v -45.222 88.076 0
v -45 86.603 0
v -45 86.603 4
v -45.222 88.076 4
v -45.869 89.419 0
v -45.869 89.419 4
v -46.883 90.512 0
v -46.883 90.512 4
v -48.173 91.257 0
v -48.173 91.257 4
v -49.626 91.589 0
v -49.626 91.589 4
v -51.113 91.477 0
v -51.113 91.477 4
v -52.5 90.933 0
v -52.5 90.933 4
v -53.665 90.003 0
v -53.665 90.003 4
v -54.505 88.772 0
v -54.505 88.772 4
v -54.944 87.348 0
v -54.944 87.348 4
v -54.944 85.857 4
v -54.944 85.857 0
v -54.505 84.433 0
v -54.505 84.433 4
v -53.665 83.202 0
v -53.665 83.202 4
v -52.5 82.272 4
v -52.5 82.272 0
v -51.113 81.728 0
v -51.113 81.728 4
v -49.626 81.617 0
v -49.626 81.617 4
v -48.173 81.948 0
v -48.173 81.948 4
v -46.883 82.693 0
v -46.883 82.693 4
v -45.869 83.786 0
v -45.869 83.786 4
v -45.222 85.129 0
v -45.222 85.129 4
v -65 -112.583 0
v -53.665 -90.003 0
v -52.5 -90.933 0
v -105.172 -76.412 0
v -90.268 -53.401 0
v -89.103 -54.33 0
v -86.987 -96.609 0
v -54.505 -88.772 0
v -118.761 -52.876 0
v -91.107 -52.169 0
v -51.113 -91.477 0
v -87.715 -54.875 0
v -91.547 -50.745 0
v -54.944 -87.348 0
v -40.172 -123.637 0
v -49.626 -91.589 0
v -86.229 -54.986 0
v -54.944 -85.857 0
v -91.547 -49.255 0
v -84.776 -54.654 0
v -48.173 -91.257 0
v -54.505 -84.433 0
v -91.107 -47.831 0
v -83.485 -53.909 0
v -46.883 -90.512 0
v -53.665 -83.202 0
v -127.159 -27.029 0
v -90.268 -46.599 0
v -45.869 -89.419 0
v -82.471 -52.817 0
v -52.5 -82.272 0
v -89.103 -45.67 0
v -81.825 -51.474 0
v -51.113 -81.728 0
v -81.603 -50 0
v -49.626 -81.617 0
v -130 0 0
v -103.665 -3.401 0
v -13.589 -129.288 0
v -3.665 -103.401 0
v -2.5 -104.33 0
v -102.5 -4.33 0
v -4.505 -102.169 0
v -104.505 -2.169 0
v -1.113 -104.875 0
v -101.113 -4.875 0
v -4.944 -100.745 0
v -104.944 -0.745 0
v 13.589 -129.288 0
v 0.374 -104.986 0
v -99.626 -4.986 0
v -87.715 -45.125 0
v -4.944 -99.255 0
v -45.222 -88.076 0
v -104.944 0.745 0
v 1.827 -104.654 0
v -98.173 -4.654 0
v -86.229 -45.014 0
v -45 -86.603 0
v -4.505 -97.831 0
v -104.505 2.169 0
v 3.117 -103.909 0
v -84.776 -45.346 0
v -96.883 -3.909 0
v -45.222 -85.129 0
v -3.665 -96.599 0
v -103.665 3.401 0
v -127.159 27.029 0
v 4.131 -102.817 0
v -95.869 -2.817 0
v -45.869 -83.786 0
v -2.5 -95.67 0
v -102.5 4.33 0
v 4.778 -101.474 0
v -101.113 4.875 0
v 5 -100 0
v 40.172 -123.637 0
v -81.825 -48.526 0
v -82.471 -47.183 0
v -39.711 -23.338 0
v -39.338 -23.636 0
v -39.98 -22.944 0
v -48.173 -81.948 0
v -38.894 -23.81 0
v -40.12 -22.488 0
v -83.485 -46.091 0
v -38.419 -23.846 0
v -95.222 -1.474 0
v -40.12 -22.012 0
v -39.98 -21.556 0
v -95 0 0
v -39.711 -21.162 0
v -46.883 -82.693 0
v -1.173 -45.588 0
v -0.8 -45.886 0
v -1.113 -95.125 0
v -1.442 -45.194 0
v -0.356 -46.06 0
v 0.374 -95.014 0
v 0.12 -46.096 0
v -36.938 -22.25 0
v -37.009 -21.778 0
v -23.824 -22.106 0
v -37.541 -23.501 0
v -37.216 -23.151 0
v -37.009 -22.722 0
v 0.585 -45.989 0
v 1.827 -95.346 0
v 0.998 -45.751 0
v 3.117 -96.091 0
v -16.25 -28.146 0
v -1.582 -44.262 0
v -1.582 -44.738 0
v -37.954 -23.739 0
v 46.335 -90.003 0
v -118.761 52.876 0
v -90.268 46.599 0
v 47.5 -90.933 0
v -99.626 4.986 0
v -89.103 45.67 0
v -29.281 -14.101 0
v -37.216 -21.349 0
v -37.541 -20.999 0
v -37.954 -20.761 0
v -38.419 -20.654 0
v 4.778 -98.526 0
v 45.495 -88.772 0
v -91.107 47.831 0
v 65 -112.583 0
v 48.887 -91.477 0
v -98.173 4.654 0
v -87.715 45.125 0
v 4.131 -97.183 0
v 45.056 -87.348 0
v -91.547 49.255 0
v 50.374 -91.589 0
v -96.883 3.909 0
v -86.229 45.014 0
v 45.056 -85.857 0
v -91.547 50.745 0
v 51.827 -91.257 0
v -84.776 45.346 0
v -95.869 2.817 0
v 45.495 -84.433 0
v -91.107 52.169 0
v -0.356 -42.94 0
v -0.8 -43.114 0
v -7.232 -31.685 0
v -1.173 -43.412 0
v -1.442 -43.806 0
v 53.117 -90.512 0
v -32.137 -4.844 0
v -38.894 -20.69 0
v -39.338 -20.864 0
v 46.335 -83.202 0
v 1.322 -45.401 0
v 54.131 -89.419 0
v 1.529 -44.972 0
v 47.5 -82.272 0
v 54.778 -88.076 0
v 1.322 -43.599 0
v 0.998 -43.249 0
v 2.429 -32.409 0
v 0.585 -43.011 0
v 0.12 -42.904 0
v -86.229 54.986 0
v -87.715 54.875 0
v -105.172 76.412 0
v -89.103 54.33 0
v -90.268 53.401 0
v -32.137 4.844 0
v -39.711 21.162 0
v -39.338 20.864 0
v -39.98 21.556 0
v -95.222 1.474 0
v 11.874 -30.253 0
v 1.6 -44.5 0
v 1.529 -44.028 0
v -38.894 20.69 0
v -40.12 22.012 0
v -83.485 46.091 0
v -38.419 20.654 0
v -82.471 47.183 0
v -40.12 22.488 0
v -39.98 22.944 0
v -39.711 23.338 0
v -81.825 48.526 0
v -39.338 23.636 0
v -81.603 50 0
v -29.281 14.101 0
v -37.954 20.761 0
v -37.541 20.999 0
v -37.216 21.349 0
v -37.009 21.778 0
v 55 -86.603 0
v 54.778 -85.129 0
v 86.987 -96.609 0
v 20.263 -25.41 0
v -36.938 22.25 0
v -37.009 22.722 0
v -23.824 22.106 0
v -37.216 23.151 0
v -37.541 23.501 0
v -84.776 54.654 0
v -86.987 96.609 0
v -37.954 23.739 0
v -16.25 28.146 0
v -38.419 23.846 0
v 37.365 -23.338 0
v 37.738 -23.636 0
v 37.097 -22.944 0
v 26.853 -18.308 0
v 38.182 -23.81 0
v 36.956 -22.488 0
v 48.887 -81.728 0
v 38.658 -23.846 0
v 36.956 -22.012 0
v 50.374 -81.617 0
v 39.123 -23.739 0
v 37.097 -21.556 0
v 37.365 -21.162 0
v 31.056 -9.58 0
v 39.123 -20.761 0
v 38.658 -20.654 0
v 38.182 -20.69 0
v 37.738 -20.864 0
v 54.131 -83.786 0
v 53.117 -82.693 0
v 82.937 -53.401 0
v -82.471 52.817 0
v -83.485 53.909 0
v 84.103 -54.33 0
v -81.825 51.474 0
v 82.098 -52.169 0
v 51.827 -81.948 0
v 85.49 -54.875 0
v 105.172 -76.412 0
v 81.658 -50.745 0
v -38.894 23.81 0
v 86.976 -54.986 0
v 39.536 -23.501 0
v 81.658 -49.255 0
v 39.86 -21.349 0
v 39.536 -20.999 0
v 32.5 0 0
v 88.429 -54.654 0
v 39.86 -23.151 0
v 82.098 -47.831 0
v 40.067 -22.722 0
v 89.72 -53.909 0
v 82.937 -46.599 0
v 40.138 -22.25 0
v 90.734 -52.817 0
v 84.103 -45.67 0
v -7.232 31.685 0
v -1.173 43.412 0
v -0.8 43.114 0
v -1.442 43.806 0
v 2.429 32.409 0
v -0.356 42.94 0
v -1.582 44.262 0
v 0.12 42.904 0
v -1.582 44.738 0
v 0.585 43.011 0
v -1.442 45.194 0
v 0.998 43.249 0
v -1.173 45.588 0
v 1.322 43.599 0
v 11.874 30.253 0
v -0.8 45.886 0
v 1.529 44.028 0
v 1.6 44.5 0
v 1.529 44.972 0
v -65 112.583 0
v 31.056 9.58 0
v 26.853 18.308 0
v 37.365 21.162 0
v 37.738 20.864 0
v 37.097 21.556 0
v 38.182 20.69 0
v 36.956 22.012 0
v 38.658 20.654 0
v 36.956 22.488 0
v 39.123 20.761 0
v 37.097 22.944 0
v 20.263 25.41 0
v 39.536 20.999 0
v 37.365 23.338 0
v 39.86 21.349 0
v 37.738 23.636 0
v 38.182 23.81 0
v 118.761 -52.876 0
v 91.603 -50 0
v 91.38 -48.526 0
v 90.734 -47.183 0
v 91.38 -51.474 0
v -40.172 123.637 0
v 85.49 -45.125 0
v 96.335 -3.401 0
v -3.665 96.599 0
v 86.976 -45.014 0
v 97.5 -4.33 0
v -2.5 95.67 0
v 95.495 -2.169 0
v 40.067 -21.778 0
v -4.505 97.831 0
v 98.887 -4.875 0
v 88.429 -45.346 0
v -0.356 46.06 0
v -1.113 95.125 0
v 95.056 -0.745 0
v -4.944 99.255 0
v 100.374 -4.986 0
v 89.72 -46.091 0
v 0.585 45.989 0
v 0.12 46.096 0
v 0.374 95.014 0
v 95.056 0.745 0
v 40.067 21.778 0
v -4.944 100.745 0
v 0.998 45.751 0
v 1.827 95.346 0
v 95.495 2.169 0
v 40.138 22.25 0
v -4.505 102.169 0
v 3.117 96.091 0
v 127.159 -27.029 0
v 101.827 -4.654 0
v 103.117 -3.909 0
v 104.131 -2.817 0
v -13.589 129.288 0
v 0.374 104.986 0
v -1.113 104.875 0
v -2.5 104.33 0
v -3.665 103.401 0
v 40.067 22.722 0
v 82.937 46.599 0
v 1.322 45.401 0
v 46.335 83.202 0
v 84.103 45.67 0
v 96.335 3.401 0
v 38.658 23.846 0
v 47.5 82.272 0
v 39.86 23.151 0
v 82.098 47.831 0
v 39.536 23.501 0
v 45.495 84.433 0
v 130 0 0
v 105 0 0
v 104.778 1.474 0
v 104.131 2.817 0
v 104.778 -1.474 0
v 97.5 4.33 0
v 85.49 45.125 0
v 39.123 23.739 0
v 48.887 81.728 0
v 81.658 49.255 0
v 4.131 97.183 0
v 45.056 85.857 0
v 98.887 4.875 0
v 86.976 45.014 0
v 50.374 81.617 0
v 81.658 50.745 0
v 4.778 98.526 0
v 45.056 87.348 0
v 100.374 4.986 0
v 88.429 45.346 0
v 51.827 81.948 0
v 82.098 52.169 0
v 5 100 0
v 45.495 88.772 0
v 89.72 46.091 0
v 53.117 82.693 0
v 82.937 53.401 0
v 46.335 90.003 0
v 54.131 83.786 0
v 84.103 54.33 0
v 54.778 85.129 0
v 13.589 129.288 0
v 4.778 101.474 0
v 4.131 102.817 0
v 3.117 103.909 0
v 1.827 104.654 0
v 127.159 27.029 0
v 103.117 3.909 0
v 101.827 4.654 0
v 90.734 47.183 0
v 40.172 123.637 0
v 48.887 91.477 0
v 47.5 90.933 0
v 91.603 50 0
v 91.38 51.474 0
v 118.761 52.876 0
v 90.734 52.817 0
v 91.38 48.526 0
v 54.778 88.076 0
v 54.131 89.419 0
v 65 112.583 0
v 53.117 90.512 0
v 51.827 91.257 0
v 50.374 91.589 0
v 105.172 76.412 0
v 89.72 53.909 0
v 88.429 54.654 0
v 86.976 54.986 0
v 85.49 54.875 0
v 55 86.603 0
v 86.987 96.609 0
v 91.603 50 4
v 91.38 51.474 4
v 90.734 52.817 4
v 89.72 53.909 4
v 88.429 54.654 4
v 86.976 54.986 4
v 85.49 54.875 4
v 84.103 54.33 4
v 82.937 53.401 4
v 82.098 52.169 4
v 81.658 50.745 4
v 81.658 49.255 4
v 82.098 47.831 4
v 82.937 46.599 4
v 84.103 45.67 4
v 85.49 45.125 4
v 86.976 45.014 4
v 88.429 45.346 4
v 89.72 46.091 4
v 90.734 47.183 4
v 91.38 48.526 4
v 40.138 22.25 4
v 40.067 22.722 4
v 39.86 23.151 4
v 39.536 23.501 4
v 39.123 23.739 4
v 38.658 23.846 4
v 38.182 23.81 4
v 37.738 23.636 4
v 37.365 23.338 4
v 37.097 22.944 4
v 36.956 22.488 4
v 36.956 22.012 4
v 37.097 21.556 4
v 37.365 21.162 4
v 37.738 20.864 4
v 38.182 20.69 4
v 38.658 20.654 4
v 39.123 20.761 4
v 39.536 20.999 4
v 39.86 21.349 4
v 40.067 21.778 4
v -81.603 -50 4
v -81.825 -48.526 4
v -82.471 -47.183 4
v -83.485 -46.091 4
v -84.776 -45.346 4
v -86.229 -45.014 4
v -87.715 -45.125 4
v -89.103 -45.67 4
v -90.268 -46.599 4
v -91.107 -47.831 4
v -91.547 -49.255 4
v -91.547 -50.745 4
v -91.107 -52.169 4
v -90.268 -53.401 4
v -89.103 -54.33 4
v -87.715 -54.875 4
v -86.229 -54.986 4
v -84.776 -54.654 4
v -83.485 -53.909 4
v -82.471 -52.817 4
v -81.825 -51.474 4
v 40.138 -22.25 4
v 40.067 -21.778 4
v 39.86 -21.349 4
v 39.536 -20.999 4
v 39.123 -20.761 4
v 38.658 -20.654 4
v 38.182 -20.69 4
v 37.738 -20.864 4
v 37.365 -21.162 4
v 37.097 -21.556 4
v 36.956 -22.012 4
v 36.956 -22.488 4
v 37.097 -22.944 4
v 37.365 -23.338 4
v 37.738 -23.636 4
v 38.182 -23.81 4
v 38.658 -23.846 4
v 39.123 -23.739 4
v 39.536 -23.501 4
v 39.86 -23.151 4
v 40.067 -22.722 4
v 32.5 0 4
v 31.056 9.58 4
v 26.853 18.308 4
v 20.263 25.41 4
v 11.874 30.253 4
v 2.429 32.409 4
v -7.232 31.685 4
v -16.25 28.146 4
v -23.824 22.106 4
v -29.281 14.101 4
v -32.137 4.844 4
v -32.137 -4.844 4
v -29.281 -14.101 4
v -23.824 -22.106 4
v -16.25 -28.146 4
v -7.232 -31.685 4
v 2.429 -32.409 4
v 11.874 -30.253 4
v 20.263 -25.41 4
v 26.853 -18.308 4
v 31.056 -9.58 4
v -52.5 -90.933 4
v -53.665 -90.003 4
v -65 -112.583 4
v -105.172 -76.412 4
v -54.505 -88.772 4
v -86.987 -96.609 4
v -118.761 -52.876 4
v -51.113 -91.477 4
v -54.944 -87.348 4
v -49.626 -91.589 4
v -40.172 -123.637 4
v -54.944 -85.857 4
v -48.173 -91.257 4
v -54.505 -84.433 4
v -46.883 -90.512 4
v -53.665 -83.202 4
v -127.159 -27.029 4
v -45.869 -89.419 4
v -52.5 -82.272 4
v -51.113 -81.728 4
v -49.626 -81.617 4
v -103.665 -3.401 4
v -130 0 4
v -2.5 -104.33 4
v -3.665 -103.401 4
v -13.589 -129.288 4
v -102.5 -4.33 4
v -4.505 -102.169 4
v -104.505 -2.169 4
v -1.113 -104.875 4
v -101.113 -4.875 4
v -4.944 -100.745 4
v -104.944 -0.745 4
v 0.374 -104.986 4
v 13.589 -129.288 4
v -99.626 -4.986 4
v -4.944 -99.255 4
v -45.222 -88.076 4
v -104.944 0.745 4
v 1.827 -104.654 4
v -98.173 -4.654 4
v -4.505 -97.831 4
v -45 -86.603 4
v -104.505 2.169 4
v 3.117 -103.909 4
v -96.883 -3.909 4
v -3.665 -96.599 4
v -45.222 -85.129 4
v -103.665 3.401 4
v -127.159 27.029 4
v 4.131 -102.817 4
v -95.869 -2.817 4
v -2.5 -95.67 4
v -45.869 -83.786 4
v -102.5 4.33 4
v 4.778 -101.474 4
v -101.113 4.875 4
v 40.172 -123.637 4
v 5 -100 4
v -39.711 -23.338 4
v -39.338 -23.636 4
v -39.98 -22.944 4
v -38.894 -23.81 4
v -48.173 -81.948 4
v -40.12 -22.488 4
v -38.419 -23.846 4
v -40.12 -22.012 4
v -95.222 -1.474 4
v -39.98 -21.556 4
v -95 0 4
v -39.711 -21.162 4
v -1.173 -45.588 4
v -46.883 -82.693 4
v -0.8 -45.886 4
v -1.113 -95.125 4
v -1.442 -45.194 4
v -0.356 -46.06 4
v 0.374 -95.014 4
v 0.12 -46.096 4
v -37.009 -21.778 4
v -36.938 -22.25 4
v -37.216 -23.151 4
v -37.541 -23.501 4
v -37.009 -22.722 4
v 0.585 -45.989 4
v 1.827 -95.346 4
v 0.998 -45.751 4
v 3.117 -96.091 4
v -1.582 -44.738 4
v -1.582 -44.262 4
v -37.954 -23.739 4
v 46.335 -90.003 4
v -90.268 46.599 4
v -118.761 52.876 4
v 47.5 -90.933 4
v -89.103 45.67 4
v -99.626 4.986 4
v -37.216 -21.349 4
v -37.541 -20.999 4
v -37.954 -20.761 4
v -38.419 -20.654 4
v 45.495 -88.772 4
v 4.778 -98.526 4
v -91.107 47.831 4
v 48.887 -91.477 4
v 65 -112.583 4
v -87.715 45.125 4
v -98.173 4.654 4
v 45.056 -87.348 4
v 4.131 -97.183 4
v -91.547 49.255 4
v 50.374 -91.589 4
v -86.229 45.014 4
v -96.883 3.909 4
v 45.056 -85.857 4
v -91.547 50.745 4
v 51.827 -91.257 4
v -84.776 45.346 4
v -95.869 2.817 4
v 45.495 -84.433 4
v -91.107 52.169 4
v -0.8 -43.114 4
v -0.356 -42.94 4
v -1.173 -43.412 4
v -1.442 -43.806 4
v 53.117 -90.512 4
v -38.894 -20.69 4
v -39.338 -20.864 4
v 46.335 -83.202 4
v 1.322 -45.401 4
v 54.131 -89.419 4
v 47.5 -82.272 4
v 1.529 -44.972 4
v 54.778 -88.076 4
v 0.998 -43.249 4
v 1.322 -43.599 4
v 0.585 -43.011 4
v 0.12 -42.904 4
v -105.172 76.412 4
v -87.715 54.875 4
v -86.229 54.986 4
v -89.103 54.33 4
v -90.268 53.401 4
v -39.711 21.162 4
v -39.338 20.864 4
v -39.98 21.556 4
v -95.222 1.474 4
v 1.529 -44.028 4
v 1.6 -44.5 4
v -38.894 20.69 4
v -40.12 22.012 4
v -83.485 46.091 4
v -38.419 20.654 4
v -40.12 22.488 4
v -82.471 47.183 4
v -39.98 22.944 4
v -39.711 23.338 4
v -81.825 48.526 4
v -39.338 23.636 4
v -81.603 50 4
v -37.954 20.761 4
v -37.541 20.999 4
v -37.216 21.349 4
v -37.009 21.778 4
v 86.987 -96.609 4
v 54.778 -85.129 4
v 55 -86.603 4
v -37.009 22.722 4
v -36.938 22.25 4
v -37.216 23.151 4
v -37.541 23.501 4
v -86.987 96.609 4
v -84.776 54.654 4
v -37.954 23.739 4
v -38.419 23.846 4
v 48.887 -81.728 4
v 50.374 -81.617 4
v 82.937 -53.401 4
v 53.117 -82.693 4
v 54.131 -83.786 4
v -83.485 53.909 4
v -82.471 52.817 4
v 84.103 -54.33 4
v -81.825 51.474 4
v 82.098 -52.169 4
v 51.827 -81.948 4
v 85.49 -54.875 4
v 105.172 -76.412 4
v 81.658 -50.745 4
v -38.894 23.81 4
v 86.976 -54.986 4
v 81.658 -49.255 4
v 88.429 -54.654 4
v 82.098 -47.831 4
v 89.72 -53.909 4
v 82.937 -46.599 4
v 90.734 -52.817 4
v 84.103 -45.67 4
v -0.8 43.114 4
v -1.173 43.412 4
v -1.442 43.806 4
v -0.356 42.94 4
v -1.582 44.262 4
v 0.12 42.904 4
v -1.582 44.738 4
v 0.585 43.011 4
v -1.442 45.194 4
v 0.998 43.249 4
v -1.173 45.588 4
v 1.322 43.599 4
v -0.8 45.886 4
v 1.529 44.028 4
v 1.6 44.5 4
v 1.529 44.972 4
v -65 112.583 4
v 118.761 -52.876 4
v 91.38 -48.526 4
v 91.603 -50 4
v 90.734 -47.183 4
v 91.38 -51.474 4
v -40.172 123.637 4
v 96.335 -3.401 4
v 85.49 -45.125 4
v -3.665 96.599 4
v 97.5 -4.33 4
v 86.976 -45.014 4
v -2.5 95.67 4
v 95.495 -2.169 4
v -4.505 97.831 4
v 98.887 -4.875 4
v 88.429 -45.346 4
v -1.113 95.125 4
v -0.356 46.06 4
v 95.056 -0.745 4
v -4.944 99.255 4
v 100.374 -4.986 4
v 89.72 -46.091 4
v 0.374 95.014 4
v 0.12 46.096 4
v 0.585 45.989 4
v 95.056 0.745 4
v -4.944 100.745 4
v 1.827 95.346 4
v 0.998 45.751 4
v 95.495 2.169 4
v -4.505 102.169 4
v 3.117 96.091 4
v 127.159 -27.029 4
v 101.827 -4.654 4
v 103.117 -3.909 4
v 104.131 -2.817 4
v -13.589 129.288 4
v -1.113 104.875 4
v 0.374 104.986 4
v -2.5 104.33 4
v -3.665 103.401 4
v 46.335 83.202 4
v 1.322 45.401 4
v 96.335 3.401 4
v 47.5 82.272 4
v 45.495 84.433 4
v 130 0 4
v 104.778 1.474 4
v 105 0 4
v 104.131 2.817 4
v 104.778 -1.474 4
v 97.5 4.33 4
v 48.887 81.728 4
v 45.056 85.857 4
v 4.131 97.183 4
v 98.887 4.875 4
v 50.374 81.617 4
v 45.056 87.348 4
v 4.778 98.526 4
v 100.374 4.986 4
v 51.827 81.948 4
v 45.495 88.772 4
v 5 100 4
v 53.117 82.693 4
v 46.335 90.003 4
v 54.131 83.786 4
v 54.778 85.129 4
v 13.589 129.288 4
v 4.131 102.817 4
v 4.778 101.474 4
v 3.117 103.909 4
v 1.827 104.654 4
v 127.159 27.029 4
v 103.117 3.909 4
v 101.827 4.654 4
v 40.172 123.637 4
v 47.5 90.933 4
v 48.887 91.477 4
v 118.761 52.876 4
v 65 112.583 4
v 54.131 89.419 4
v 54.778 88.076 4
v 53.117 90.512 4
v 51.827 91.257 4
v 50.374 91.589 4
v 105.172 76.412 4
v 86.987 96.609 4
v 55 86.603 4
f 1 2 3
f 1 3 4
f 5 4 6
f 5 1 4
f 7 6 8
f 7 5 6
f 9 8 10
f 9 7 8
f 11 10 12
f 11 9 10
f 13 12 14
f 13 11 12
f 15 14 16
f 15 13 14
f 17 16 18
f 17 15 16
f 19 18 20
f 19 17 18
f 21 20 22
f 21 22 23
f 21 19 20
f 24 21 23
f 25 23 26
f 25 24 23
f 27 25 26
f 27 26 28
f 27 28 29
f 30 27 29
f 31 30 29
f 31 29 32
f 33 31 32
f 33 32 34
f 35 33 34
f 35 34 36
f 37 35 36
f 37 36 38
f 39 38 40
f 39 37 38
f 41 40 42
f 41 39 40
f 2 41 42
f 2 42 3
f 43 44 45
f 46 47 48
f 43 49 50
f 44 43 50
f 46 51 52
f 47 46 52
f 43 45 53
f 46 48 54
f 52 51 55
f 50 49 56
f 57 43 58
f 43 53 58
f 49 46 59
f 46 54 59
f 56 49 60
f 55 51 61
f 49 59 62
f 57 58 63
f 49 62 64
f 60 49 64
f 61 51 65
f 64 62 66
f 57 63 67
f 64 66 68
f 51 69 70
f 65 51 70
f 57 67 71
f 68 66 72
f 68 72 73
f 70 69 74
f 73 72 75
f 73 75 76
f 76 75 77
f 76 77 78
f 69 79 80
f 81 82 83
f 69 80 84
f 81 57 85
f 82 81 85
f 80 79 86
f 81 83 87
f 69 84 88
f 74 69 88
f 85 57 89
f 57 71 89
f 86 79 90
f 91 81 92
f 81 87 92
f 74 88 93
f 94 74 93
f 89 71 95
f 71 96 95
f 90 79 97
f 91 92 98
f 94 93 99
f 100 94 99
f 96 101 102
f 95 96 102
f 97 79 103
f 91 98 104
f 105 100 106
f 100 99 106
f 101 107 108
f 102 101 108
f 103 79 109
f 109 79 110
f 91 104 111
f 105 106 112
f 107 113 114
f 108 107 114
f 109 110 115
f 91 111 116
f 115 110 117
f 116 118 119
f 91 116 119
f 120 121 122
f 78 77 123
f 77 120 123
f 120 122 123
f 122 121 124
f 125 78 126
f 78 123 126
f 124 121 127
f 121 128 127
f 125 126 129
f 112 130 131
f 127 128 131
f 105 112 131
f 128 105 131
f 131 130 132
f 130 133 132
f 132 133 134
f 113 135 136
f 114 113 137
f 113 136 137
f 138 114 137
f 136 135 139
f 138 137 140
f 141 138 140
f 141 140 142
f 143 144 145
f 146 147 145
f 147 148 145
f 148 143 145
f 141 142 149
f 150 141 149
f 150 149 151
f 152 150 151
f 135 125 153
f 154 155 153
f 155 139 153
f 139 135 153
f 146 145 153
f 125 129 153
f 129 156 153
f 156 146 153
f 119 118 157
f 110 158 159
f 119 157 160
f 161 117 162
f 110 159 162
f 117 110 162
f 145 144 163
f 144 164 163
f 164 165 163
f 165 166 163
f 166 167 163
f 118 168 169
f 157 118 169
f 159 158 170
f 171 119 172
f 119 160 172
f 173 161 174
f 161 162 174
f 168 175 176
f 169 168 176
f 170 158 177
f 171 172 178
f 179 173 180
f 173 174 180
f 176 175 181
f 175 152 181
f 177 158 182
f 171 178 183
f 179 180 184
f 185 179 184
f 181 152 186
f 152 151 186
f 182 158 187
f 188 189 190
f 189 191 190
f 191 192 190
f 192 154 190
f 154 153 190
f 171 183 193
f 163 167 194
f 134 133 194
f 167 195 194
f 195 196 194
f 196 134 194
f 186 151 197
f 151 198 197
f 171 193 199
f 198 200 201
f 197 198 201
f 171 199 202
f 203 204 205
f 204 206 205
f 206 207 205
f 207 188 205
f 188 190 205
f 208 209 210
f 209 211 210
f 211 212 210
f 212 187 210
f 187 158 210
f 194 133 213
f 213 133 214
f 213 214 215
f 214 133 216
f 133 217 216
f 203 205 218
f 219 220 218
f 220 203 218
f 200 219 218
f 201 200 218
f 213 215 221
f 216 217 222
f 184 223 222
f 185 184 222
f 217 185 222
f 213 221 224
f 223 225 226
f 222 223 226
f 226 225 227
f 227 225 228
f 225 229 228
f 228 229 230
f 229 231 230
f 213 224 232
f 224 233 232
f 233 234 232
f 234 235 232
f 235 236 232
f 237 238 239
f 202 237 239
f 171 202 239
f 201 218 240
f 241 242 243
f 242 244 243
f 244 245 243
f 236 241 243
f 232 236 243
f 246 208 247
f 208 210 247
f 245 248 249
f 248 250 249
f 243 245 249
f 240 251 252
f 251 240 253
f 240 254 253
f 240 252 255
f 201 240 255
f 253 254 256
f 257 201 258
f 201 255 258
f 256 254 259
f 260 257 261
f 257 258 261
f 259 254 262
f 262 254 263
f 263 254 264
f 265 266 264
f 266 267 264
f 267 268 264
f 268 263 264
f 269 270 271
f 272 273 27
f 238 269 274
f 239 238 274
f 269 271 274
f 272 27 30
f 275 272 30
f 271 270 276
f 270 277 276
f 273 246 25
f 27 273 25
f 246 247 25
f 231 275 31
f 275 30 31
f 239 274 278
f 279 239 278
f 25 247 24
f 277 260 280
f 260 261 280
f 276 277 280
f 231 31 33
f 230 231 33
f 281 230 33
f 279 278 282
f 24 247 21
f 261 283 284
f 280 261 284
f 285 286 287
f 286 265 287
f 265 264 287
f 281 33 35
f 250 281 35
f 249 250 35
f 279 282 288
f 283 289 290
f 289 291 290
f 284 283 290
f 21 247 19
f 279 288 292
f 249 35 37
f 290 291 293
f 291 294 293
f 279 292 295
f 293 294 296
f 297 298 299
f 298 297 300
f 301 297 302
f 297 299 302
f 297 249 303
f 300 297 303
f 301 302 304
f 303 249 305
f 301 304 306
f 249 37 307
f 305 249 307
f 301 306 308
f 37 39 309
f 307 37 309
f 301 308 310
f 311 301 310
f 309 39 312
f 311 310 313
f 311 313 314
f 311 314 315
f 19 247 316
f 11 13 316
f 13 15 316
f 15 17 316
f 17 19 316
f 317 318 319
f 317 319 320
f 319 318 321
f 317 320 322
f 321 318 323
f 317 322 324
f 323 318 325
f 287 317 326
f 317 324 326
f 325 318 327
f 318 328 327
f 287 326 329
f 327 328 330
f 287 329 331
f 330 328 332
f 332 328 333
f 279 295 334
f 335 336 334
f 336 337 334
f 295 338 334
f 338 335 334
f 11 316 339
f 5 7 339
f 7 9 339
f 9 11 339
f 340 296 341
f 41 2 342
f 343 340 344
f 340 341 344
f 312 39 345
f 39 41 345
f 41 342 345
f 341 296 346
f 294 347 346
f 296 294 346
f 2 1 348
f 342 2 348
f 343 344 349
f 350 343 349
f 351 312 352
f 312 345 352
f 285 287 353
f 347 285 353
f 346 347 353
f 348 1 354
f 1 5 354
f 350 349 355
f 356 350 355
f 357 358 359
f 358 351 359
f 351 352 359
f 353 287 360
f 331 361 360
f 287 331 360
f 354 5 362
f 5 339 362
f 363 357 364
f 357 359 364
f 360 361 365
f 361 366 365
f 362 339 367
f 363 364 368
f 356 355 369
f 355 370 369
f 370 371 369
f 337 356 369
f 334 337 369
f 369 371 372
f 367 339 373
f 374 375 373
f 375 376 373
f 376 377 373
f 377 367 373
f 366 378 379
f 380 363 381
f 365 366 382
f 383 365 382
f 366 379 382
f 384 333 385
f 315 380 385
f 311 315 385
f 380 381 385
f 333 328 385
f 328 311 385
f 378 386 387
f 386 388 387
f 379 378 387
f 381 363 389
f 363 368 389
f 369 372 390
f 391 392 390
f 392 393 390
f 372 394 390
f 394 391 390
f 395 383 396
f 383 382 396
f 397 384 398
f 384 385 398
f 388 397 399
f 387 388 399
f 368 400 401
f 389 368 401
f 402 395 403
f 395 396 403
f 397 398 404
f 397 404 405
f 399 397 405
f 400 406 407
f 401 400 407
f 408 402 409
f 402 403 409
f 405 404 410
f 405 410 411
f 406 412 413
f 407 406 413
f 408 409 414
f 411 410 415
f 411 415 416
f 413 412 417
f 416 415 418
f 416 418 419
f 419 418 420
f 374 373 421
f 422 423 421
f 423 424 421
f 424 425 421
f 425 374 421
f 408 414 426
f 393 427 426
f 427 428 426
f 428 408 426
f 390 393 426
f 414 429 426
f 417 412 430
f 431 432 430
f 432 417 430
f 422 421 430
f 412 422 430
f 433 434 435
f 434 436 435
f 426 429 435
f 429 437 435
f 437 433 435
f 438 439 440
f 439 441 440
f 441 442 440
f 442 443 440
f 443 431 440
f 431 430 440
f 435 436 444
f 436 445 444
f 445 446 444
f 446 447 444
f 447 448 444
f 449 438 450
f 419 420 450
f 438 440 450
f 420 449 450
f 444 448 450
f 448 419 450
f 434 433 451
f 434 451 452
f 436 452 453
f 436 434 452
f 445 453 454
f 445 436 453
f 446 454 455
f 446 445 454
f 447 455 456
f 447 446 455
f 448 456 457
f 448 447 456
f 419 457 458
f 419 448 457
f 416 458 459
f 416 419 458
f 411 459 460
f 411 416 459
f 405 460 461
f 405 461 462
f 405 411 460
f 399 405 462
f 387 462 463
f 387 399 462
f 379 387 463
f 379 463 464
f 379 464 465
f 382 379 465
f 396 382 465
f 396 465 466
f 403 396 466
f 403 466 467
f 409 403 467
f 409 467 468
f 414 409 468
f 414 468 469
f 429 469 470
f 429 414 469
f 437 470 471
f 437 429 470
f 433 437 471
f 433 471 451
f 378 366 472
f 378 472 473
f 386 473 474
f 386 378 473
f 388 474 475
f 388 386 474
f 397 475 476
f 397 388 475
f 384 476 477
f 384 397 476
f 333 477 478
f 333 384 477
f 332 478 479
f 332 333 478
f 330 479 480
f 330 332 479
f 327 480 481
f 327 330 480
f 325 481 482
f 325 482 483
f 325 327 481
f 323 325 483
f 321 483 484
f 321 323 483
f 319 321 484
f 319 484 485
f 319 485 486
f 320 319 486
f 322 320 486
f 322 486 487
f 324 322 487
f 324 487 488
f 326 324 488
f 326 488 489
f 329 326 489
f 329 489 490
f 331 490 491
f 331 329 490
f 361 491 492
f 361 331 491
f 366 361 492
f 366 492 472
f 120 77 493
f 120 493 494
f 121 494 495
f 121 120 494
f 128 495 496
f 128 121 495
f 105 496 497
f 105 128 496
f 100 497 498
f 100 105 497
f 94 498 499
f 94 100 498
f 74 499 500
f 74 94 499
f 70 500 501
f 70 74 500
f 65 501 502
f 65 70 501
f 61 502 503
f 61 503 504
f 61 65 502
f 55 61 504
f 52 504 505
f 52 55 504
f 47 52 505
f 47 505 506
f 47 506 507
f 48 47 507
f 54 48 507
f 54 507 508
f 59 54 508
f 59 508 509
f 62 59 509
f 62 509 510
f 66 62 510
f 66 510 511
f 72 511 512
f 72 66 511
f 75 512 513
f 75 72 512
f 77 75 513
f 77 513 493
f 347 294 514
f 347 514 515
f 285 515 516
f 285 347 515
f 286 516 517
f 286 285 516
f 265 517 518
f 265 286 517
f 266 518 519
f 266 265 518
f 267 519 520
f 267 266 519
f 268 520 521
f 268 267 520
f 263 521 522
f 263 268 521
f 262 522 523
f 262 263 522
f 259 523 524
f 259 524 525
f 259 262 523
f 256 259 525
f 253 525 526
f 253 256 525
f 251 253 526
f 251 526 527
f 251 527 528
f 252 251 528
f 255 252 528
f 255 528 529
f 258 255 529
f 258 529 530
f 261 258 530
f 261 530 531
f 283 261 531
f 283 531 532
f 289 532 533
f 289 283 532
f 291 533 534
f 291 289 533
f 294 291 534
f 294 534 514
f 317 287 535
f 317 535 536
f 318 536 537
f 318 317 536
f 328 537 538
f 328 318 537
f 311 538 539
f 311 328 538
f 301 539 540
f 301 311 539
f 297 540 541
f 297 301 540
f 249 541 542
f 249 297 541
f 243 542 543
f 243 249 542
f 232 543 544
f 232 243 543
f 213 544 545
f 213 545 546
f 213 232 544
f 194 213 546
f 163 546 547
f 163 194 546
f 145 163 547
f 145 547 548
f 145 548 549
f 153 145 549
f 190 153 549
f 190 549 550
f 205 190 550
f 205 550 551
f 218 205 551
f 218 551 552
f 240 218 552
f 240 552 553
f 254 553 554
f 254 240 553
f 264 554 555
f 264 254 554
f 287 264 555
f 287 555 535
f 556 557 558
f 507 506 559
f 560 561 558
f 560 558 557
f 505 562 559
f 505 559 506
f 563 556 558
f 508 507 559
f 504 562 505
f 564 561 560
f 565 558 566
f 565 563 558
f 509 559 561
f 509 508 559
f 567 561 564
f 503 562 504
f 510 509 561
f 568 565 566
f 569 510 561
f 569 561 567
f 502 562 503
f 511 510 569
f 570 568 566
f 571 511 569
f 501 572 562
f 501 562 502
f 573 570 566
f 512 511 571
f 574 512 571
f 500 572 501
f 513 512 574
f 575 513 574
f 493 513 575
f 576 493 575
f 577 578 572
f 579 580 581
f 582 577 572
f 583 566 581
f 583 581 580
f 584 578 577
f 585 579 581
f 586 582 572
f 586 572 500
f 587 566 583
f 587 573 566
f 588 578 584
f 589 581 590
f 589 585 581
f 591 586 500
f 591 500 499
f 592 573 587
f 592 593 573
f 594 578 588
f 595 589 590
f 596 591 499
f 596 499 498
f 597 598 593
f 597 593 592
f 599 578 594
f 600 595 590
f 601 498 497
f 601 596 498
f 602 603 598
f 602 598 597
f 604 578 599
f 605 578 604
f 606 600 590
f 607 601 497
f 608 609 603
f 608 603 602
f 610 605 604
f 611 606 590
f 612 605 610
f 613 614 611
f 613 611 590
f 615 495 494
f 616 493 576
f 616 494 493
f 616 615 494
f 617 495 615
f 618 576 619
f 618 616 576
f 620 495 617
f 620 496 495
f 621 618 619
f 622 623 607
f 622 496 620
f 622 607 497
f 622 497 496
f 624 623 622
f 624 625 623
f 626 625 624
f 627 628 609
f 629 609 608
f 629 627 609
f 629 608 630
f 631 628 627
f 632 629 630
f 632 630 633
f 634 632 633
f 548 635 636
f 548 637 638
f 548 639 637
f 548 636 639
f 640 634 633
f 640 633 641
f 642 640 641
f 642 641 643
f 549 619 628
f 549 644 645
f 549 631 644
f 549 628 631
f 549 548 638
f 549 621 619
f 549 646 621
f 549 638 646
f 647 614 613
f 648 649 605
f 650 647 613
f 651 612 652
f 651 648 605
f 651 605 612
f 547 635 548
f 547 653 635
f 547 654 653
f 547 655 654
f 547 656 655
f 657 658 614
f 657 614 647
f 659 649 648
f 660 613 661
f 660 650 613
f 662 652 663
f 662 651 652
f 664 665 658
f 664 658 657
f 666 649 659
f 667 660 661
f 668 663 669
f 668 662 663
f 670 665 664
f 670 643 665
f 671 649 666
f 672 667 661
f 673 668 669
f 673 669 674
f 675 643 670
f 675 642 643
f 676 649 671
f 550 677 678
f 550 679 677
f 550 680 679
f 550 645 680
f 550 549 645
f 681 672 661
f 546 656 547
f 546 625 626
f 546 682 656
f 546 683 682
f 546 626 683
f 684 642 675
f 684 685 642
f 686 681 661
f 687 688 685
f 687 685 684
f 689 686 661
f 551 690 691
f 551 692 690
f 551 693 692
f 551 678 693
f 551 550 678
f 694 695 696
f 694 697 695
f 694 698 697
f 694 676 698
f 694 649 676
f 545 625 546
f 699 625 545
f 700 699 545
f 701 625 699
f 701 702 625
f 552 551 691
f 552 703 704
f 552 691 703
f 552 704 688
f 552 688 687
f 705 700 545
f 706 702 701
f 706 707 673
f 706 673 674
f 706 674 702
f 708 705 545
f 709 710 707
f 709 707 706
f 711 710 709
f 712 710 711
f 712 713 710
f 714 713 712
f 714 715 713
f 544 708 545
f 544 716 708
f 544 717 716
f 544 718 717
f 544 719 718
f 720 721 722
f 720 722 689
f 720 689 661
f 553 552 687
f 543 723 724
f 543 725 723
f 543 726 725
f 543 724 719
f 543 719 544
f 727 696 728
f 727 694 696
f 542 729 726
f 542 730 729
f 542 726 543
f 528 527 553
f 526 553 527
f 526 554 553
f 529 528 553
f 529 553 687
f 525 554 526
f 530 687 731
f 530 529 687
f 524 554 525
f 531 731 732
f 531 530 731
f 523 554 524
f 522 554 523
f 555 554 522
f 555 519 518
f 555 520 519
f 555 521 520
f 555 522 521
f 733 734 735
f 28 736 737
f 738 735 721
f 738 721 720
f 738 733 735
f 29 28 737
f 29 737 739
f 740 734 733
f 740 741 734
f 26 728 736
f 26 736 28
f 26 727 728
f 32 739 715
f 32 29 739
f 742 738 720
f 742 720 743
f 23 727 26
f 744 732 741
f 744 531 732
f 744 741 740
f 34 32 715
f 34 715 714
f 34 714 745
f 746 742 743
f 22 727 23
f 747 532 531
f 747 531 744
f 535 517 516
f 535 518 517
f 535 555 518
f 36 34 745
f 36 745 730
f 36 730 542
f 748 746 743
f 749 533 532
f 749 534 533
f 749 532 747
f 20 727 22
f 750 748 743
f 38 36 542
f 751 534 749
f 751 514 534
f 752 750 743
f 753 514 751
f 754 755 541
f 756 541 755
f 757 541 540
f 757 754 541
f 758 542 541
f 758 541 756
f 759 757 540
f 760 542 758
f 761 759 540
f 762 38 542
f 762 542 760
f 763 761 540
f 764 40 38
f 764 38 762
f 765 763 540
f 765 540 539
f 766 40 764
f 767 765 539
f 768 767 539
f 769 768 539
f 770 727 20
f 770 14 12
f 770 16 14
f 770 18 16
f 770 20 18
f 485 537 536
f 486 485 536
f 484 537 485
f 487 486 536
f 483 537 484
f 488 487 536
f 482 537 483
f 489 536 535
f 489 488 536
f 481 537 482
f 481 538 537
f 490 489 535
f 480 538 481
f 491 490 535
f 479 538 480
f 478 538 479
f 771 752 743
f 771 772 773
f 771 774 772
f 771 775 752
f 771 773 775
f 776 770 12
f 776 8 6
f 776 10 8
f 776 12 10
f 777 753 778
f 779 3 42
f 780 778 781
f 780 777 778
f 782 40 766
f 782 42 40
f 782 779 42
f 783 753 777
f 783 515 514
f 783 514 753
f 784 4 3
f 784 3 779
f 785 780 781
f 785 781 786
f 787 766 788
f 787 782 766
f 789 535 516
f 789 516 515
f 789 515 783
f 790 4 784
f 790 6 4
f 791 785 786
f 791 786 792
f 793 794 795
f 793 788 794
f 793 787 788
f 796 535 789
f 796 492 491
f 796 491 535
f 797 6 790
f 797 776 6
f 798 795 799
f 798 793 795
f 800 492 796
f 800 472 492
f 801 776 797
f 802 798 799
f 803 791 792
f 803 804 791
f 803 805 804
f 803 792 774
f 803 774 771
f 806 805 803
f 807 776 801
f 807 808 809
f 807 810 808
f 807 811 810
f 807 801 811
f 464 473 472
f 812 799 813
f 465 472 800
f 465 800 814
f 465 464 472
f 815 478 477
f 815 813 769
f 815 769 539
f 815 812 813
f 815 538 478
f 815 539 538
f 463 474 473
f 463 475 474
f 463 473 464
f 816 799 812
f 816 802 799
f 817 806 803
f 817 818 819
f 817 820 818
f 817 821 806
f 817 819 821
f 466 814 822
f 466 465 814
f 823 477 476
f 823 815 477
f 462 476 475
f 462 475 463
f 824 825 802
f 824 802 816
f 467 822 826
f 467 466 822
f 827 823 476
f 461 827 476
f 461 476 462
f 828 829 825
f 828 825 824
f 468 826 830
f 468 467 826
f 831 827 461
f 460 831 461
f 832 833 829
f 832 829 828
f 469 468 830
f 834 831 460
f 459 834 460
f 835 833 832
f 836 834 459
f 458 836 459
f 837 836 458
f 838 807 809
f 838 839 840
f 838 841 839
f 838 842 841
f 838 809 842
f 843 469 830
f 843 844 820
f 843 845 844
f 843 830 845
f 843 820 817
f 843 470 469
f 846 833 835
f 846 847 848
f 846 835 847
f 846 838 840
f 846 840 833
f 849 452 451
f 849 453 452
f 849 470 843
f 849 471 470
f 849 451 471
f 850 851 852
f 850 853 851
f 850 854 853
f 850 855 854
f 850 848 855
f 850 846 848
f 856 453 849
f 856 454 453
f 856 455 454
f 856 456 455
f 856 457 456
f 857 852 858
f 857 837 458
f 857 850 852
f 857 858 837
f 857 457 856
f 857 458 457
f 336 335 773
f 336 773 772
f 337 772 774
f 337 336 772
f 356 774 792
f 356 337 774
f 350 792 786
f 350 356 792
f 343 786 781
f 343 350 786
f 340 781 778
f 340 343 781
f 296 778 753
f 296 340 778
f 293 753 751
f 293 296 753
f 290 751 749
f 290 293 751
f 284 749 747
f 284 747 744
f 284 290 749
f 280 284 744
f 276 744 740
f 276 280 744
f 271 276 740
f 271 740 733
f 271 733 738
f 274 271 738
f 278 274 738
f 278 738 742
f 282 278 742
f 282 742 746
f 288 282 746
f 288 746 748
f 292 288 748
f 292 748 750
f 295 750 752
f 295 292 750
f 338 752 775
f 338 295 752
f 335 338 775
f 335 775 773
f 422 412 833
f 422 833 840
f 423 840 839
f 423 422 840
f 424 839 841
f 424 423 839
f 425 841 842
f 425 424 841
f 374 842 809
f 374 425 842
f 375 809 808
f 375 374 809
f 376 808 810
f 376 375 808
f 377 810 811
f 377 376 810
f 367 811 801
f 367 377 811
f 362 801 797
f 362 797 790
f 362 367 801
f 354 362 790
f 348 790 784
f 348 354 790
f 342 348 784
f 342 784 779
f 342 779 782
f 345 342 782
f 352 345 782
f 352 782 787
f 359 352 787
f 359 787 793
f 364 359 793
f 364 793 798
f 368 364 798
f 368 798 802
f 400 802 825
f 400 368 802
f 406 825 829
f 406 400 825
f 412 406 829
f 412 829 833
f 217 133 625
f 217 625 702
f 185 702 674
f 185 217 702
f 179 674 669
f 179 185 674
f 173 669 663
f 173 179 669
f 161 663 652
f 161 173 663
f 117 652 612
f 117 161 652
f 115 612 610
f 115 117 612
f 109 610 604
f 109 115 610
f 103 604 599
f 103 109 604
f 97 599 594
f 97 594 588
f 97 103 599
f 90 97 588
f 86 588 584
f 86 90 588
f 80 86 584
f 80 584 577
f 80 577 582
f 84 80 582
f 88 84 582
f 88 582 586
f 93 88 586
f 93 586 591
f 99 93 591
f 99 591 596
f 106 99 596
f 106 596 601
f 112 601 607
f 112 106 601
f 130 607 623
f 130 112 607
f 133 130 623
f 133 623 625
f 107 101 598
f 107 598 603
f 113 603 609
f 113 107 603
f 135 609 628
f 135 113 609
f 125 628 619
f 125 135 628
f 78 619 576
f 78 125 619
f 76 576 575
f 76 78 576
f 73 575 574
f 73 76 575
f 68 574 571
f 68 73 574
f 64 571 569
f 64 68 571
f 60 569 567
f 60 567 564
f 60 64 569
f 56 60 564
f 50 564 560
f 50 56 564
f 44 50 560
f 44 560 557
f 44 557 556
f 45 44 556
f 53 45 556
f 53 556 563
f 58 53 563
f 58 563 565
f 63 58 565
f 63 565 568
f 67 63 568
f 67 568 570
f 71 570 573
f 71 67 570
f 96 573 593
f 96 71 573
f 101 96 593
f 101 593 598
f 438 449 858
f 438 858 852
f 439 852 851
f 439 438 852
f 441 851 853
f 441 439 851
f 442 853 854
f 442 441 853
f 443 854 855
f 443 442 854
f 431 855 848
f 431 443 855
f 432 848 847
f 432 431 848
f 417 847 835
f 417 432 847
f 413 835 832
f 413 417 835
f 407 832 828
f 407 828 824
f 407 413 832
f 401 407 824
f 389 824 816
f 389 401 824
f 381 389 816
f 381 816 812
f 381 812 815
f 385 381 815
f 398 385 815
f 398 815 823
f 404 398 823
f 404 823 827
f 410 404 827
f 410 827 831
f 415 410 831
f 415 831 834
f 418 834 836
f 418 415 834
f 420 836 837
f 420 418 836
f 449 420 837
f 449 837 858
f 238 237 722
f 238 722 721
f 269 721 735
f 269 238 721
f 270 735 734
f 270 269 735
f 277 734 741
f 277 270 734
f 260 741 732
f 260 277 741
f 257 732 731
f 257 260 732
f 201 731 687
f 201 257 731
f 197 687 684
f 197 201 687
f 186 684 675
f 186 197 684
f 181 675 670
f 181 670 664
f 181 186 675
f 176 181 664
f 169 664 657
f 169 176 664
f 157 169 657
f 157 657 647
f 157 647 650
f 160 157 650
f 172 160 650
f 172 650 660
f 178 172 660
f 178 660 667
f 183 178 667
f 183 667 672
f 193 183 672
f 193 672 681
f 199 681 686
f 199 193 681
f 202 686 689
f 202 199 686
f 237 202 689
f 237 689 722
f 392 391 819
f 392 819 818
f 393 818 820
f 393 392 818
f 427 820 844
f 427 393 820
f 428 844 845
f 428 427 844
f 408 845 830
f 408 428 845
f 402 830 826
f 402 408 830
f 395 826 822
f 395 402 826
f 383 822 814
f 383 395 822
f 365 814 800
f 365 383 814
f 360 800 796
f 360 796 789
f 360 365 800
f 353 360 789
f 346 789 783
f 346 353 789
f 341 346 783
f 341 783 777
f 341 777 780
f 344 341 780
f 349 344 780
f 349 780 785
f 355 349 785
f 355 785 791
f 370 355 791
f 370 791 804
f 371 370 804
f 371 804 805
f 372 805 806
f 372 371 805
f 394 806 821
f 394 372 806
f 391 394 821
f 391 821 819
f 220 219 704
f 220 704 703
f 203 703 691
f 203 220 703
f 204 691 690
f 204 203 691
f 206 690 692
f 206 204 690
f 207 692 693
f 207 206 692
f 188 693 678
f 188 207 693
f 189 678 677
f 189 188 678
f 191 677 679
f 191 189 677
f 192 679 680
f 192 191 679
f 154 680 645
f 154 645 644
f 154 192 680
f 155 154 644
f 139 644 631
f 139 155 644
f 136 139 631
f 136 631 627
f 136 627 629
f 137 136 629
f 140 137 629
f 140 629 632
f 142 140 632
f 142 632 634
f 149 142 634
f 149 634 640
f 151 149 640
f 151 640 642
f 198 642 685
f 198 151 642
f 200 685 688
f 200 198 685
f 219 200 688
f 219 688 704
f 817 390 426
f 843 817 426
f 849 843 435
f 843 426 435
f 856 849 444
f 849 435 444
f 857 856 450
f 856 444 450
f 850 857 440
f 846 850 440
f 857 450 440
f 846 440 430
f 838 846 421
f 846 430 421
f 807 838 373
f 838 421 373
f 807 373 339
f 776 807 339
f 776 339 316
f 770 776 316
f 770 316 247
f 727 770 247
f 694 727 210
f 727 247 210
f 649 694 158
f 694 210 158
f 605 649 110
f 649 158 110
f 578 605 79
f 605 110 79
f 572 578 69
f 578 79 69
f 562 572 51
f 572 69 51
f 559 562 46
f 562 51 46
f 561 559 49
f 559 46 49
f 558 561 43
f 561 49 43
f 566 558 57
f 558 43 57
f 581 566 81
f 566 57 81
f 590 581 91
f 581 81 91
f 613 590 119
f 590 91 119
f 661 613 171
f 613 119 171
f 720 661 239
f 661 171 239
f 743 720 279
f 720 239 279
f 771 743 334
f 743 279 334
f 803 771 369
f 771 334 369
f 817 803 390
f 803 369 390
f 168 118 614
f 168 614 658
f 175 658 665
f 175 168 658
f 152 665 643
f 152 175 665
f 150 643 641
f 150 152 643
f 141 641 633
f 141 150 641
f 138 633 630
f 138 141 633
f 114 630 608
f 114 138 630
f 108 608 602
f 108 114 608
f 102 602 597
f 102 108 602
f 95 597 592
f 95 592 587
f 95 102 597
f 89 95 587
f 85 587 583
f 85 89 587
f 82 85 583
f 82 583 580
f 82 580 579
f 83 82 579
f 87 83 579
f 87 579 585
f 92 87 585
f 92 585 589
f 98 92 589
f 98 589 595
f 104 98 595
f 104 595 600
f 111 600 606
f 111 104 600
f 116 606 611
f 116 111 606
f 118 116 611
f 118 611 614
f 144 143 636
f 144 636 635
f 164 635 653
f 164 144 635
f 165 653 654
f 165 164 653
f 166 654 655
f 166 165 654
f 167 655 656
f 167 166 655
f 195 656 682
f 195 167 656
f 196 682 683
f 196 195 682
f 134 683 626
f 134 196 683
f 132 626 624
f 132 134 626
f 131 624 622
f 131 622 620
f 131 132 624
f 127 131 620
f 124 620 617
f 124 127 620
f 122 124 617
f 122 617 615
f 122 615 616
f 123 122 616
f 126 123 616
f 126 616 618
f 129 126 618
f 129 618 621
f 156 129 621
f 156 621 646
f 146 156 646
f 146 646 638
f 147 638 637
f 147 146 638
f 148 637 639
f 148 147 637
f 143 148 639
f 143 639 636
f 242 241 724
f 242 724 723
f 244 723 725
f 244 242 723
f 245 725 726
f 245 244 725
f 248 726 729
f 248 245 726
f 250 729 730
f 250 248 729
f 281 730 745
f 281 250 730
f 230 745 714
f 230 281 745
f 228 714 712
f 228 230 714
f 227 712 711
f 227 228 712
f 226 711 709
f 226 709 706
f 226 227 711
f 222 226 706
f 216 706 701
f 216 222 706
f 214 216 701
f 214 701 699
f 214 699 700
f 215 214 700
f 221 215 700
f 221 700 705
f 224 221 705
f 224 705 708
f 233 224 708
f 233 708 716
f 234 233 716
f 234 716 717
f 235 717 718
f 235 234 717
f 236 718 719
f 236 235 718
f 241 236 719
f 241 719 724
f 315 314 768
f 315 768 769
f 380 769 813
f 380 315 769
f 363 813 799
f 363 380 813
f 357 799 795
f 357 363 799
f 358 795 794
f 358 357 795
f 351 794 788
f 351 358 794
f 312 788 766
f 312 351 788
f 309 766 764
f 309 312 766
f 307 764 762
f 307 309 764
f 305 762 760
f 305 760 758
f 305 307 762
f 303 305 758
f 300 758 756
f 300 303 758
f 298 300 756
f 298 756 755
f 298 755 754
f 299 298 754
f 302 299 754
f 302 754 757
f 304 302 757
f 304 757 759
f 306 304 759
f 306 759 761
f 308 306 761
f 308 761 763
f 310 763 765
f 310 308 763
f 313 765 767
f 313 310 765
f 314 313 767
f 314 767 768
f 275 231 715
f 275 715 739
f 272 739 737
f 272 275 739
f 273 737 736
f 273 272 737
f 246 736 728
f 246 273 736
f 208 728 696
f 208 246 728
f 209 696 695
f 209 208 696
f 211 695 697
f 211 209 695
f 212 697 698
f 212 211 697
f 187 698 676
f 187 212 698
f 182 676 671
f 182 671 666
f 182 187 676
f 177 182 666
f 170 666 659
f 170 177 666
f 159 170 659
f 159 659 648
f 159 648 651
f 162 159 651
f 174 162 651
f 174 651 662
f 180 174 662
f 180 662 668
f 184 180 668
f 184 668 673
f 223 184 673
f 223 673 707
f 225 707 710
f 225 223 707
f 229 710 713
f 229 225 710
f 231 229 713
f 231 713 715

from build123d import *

# Parameters (mm, degrees)
SKETCH_1_R      = 130
SKETCH_1_R_2    = 32.5
SKETCH_1_R_3    = 5
SKETCH_1_R_4    = 1.6
EXTRUDE_1_DEPTH = 4


with BuildPart() as part:
    # 草图1 → 凸台-拉伸1 (new body)
    with BuildSketch(Plane.XY):
        Circle(SKETCH_1_R)
        Circle(SKETCH_1_R_2, mode=Mode.SUBTRACT)
        with Locations((0, 100)):
            Circle(SKETCH_1_R_3, mode=Mode.SUBTRACT)
        with Locations((50, 86.602540378)):
            Circle(SKETCH_1_R_3, mode=Mode.SUBTRACT)
        with Locations((86.602540378, 50)):
            Circle(SKETCH_1_R_3, mode=Mode.SUBTRACT)
        with Locations((100, 0)):
            Circle(SKETCH_1_R_3, mode=Mode.SUBTRACT)
        with Locations((86.602540378, -50)):
            Circle(SKETCH_1_R_3, mode=Mode.SUBTRACT)
        with Locations((50, -86.602540378)):
            Circle(SKETCH_1_R_3, mode=Mode.SUBTRACT)
        with Locations((0, -100)):
            Circle(SKETCH_1_R_3, mode=Mode.SUBTRACT)
        with Locations((-50, -86.602540378)):
            Circle(SKETCH_1_R_3, mode=Mode.SUBTRACT)
        with Locations((-86.602540378, -50)):
            Circle(SKETCH_1_R_3, mode=Mode.SUBTRACT)
        with Locations((-100, 0)):
            Circle(SKETCH_1_R_3, mode=Mode.SUBTRACT)
        with Locations((-86.602540378, 50)):
            Circle(SKETCH_1_R_3, mode=Mode.SUBTRACT)
        with Locations((-50, 86.602540378)):
            Circle(SKETCH_1_R_3, mode=Mode.SUBTRACT)
        with Locations((0, 44.5)):
            Circle(SKETCH_1_R_4, mode=Mode.SUBTRACT)
        with Locations((38.538130468, 22.25)):
            Circle(SKETCH_1_R_4, mode=Mode.SUBTRACT)
        with Locations((38.538130468, -22.25)):
            Circle(SKETCH_1_R_4, mode=Mode.SUBTRACT)
        with Locations((0, -44.5)):
            Circle(SKETCH_1_R_4, mode=Mode.SUBTRACT)
        with Locations((-38.538130468, -22.25)):
            Circle(SKETCH_1_R_4, mode=Mode.SUBTRACT)
        with Locations((-38.538130468, 22.25)):
            Circle(SKETCH_1_R_4, mode=Mode.SUBTRACT)
    extrude(amount=EXTRUDE_1_DEPTH)


solid = part.part
